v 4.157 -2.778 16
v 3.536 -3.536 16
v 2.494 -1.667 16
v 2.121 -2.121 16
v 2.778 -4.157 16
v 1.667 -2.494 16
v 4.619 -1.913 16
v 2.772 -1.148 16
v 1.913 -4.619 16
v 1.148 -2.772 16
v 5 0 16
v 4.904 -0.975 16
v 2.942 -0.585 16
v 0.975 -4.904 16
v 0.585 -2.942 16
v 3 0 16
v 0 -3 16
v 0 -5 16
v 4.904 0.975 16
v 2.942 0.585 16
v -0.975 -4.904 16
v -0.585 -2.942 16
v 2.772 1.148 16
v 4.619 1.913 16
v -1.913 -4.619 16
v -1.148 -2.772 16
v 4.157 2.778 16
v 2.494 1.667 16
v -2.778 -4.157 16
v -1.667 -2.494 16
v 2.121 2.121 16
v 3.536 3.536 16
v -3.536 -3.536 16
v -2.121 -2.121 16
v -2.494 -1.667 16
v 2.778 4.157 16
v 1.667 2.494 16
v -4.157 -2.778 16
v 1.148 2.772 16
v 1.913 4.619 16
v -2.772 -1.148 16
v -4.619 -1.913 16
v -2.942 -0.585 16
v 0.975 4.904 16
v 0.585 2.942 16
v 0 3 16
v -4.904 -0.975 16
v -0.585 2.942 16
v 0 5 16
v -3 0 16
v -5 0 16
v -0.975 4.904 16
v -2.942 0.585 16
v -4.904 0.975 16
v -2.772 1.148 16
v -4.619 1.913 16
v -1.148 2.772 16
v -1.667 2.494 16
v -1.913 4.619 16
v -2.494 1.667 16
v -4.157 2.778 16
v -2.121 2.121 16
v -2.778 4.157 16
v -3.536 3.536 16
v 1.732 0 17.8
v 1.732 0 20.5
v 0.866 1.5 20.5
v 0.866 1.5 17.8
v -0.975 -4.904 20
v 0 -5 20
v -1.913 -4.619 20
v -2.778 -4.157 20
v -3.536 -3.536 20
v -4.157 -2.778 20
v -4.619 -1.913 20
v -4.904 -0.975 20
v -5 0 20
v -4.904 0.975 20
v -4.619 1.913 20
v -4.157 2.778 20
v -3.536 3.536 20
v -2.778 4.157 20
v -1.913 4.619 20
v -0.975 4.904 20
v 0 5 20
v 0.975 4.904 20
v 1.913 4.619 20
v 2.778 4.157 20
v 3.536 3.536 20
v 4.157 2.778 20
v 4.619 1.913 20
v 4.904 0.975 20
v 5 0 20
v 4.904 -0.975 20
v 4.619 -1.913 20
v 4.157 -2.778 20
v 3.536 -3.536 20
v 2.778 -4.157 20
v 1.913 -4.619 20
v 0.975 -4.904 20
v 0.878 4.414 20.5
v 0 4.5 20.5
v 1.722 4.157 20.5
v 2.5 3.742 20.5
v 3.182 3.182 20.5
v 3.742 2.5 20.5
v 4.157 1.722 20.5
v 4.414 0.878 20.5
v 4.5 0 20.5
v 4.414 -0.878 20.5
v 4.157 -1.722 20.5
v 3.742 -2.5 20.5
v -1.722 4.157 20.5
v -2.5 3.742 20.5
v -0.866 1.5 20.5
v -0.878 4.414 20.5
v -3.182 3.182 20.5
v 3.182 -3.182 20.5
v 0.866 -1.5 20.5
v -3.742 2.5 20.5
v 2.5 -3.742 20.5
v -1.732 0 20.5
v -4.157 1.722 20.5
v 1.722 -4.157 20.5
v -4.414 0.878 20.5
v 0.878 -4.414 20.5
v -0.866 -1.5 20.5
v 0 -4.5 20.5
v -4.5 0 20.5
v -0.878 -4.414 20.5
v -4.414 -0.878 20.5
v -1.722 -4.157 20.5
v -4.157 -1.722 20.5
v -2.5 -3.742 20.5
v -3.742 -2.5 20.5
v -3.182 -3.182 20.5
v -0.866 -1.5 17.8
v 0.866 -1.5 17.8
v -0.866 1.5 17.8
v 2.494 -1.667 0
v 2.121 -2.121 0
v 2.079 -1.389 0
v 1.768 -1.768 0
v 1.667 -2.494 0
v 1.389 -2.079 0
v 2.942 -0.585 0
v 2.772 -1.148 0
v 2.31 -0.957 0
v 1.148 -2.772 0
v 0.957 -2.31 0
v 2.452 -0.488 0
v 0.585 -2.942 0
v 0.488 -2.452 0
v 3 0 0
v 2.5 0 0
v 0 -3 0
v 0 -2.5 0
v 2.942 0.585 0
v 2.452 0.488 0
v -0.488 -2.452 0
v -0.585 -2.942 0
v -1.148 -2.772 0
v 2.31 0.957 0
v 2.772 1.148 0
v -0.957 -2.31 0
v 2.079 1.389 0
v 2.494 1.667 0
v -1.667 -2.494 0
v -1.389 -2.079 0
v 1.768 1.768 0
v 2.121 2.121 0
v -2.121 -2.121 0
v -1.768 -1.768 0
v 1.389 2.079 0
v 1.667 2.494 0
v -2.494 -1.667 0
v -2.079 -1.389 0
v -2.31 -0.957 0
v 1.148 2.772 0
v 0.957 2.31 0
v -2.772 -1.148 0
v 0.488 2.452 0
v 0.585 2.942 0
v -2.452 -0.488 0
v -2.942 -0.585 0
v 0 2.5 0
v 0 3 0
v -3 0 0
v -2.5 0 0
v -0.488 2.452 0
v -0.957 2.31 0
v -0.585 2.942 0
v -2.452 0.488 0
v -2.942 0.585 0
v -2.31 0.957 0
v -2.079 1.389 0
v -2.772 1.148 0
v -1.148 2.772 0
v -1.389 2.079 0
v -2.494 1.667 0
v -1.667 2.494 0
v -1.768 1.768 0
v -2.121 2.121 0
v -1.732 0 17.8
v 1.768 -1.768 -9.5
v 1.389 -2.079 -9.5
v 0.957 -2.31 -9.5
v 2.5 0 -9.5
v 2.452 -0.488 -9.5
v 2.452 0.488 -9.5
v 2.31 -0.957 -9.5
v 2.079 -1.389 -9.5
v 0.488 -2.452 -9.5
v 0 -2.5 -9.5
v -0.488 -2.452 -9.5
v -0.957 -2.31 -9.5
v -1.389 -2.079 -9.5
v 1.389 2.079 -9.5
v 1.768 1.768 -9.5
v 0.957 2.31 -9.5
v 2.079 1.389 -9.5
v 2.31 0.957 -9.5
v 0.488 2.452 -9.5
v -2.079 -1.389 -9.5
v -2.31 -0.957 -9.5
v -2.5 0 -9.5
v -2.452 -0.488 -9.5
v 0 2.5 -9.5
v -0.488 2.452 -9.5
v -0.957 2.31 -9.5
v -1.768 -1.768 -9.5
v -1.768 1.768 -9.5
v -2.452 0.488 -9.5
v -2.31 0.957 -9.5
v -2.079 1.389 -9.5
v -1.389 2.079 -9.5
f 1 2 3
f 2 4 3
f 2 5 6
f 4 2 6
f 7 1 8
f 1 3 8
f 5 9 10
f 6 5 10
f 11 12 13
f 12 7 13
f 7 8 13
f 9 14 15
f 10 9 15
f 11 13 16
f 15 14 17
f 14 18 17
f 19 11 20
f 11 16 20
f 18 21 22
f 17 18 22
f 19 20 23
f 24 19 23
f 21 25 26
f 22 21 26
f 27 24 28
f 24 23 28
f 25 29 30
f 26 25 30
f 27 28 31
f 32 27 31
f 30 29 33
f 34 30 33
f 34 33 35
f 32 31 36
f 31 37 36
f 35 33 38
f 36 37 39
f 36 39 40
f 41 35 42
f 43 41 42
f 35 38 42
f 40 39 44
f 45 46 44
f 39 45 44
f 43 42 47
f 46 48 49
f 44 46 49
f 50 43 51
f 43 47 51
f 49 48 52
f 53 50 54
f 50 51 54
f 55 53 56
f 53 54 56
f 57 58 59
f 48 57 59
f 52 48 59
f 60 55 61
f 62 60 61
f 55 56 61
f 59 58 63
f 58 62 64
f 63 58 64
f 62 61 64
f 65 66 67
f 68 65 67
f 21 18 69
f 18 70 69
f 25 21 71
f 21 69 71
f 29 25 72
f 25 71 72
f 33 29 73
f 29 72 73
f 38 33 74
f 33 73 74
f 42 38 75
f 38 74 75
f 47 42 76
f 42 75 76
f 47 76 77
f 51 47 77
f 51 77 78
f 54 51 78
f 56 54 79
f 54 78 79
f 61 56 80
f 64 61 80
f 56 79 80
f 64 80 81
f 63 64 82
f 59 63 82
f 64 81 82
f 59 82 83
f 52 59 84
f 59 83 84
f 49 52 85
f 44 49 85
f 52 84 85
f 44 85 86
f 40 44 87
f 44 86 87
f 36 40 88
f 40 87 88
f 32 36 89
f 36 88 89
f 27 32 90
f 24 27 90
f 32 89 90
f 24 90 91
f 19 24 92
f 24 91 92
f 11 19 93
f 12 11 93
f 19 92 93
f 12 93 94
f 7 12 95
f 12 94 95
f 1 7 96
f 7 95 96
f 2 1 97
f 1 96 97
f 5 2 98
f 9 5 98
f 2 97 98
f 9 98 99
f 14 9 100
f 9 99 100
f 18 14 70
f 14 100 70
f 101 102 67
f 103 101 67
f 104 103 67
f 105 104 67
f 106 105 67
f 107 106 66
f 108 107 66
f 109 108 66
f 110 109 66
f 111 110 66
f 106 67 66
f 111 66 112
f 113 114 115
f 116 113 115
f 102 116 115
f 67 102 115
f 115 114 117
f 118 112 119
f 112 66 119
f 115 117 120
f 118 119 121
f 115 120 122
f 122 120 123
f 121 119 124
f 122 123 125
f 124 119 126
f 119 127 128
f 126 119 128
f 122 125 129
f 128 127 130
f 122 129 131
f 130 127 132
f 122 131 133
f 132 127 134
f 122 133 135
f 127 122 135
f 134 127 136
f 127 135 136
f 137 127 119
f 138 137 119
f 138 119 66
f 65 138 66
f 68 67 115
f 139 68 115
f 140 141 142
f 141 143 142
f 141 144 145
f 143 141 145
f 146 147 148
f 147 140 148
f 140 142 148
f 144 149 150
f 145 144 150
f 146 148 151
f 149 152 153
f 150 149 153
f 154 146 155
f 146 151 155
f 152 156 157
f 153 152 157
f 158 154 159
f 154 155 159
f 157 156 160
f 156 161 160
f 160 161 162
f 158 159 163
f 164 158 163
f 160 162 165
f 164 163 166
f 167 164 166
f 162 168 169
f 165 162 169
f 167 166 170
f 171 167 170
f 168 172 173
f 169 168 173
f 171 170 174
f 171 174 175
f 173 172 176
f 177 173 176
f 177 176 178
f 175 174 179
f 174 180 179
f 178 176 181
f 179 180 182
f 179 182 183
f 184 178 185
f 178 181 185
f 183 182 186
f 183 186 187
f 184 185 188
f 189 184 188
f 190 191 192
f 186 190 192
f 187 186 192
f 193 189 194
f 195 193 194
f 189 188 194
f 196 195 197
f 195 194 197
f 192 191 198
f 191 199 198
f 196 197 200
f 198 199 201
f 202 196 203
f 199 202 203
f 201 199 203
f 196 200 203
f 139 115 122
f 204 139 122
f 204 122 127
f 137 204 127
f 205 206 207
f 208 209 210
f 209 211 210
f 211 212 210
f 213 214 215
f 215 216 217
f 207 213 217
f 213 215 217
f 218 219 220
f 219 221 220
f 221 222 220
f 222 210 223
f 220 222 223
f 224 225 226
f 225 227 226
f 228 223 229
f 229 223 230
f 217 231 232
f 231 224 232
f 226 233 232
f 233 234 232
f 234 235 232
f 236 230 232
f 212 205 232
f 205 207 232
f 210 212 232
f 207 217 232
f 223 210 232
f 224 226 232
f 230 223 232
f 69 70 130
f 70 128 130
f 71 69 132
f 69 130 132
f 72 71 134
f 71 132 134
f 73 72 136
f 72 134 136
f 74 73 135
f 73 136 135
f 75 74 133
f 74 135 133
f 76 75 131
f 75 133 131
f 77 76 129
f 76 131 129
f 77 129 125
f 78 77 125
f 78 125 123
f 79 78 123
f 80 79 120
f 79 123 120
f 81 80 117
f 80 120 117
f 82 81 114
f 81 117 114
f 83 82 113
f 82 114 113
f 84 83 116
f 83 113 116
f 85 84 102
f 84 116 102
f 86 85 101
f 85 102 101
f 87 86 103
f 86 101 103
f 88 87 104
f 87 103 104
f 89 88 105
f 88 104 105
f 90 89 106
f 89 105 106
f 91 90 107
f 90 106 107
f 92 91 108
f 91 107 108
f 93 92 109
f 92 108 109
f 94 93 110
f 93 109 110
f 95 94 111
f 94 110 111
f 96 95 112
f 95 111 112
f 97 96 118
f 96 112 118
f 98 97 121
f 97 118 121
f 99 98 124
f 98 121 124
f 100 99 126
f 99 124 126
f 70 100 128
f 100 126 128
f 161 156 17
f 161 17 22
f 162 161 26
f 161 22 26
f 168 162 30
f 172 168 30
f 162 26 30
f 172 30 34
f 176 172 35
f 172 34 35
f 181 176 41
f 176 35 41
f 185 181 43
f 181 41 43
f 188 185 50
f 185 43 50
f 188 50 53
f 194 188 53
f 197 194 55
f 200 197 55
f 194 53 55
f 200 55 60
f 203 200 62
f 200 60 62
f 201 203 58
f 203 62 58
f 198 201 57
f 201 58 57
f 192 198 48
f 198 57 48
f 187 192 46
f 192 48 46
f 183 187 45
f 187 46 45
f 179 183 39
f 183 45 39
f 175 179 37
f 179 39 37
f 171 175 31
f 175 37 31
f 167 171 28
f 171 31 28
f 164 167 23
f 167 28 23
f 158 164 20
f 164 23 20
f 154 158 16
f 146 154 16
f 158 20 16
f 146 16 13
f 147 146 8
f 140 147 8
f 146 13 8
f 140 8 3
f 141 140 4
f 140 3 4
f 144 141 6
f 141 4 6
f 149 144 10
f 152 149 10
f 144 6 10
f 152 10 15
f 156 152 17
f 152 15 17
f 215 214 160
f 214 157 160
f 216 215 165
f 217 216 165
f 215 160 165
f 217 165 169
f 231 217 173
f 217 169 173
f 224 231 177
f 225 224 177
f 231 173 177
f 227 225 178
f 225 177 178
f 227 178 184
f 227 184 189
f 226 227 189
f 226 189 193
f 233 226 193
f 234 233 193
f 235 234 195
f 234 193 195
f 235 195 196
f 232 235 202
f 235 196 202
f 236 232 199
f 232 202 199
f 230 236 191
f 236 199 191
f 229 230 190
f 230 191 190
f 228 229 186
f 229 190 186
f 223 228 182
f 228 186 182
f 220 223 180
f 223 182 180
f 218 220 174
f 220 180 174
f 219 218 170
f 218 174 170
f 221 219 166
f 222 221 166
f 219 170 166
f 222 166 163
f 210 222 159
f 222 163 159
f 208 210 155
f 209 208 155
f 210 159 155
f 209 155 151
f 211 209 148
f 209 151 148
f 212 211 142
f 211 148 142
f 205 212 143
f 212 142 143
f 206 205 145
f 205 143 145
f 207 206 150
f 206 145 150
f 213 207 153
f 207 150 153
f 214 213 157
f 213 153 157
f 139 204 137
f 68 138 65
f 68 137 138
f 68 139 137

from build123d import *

# Parameters (mm, degrees)
CUT_EXTRUDE1_DEPTH = 2.7


with BuildPart() as part:
    # Sketch1 → Revolve1 (revolve)
    with BuildSketch(Plane(origin=(0, 0, 0), x_dir=(0, 0, -1), z_dir=(1, 0, 0))):
        Polygon((-16, 3), (-16, 5), (-20, 5), (-20.5, 4.5), (-20.5, 0), (9.5, 0), (9.5, 2.5), (0, 2.5), (0, 3), align=None)
    revolve(axis=Axis((0, 0, 5.584882278), (0, 0, -1)))

    # Sketch2 → Cut-Extrude1 (cut)
    with BuildSketch(Plane.XY.offset(20.5)):
        Polygon((0.866025404, -1.5), (1.732050808, 0), (0.866025404, 1.5), (-0.866025404, 1.5), (-1.732050808, 0), (-0.866025404, -1.5), align=None)
    extrude(amount=-CUT_EXTRUDE1_DEPTH, mode=Mode.SUBTRACT)


solid = part.part
